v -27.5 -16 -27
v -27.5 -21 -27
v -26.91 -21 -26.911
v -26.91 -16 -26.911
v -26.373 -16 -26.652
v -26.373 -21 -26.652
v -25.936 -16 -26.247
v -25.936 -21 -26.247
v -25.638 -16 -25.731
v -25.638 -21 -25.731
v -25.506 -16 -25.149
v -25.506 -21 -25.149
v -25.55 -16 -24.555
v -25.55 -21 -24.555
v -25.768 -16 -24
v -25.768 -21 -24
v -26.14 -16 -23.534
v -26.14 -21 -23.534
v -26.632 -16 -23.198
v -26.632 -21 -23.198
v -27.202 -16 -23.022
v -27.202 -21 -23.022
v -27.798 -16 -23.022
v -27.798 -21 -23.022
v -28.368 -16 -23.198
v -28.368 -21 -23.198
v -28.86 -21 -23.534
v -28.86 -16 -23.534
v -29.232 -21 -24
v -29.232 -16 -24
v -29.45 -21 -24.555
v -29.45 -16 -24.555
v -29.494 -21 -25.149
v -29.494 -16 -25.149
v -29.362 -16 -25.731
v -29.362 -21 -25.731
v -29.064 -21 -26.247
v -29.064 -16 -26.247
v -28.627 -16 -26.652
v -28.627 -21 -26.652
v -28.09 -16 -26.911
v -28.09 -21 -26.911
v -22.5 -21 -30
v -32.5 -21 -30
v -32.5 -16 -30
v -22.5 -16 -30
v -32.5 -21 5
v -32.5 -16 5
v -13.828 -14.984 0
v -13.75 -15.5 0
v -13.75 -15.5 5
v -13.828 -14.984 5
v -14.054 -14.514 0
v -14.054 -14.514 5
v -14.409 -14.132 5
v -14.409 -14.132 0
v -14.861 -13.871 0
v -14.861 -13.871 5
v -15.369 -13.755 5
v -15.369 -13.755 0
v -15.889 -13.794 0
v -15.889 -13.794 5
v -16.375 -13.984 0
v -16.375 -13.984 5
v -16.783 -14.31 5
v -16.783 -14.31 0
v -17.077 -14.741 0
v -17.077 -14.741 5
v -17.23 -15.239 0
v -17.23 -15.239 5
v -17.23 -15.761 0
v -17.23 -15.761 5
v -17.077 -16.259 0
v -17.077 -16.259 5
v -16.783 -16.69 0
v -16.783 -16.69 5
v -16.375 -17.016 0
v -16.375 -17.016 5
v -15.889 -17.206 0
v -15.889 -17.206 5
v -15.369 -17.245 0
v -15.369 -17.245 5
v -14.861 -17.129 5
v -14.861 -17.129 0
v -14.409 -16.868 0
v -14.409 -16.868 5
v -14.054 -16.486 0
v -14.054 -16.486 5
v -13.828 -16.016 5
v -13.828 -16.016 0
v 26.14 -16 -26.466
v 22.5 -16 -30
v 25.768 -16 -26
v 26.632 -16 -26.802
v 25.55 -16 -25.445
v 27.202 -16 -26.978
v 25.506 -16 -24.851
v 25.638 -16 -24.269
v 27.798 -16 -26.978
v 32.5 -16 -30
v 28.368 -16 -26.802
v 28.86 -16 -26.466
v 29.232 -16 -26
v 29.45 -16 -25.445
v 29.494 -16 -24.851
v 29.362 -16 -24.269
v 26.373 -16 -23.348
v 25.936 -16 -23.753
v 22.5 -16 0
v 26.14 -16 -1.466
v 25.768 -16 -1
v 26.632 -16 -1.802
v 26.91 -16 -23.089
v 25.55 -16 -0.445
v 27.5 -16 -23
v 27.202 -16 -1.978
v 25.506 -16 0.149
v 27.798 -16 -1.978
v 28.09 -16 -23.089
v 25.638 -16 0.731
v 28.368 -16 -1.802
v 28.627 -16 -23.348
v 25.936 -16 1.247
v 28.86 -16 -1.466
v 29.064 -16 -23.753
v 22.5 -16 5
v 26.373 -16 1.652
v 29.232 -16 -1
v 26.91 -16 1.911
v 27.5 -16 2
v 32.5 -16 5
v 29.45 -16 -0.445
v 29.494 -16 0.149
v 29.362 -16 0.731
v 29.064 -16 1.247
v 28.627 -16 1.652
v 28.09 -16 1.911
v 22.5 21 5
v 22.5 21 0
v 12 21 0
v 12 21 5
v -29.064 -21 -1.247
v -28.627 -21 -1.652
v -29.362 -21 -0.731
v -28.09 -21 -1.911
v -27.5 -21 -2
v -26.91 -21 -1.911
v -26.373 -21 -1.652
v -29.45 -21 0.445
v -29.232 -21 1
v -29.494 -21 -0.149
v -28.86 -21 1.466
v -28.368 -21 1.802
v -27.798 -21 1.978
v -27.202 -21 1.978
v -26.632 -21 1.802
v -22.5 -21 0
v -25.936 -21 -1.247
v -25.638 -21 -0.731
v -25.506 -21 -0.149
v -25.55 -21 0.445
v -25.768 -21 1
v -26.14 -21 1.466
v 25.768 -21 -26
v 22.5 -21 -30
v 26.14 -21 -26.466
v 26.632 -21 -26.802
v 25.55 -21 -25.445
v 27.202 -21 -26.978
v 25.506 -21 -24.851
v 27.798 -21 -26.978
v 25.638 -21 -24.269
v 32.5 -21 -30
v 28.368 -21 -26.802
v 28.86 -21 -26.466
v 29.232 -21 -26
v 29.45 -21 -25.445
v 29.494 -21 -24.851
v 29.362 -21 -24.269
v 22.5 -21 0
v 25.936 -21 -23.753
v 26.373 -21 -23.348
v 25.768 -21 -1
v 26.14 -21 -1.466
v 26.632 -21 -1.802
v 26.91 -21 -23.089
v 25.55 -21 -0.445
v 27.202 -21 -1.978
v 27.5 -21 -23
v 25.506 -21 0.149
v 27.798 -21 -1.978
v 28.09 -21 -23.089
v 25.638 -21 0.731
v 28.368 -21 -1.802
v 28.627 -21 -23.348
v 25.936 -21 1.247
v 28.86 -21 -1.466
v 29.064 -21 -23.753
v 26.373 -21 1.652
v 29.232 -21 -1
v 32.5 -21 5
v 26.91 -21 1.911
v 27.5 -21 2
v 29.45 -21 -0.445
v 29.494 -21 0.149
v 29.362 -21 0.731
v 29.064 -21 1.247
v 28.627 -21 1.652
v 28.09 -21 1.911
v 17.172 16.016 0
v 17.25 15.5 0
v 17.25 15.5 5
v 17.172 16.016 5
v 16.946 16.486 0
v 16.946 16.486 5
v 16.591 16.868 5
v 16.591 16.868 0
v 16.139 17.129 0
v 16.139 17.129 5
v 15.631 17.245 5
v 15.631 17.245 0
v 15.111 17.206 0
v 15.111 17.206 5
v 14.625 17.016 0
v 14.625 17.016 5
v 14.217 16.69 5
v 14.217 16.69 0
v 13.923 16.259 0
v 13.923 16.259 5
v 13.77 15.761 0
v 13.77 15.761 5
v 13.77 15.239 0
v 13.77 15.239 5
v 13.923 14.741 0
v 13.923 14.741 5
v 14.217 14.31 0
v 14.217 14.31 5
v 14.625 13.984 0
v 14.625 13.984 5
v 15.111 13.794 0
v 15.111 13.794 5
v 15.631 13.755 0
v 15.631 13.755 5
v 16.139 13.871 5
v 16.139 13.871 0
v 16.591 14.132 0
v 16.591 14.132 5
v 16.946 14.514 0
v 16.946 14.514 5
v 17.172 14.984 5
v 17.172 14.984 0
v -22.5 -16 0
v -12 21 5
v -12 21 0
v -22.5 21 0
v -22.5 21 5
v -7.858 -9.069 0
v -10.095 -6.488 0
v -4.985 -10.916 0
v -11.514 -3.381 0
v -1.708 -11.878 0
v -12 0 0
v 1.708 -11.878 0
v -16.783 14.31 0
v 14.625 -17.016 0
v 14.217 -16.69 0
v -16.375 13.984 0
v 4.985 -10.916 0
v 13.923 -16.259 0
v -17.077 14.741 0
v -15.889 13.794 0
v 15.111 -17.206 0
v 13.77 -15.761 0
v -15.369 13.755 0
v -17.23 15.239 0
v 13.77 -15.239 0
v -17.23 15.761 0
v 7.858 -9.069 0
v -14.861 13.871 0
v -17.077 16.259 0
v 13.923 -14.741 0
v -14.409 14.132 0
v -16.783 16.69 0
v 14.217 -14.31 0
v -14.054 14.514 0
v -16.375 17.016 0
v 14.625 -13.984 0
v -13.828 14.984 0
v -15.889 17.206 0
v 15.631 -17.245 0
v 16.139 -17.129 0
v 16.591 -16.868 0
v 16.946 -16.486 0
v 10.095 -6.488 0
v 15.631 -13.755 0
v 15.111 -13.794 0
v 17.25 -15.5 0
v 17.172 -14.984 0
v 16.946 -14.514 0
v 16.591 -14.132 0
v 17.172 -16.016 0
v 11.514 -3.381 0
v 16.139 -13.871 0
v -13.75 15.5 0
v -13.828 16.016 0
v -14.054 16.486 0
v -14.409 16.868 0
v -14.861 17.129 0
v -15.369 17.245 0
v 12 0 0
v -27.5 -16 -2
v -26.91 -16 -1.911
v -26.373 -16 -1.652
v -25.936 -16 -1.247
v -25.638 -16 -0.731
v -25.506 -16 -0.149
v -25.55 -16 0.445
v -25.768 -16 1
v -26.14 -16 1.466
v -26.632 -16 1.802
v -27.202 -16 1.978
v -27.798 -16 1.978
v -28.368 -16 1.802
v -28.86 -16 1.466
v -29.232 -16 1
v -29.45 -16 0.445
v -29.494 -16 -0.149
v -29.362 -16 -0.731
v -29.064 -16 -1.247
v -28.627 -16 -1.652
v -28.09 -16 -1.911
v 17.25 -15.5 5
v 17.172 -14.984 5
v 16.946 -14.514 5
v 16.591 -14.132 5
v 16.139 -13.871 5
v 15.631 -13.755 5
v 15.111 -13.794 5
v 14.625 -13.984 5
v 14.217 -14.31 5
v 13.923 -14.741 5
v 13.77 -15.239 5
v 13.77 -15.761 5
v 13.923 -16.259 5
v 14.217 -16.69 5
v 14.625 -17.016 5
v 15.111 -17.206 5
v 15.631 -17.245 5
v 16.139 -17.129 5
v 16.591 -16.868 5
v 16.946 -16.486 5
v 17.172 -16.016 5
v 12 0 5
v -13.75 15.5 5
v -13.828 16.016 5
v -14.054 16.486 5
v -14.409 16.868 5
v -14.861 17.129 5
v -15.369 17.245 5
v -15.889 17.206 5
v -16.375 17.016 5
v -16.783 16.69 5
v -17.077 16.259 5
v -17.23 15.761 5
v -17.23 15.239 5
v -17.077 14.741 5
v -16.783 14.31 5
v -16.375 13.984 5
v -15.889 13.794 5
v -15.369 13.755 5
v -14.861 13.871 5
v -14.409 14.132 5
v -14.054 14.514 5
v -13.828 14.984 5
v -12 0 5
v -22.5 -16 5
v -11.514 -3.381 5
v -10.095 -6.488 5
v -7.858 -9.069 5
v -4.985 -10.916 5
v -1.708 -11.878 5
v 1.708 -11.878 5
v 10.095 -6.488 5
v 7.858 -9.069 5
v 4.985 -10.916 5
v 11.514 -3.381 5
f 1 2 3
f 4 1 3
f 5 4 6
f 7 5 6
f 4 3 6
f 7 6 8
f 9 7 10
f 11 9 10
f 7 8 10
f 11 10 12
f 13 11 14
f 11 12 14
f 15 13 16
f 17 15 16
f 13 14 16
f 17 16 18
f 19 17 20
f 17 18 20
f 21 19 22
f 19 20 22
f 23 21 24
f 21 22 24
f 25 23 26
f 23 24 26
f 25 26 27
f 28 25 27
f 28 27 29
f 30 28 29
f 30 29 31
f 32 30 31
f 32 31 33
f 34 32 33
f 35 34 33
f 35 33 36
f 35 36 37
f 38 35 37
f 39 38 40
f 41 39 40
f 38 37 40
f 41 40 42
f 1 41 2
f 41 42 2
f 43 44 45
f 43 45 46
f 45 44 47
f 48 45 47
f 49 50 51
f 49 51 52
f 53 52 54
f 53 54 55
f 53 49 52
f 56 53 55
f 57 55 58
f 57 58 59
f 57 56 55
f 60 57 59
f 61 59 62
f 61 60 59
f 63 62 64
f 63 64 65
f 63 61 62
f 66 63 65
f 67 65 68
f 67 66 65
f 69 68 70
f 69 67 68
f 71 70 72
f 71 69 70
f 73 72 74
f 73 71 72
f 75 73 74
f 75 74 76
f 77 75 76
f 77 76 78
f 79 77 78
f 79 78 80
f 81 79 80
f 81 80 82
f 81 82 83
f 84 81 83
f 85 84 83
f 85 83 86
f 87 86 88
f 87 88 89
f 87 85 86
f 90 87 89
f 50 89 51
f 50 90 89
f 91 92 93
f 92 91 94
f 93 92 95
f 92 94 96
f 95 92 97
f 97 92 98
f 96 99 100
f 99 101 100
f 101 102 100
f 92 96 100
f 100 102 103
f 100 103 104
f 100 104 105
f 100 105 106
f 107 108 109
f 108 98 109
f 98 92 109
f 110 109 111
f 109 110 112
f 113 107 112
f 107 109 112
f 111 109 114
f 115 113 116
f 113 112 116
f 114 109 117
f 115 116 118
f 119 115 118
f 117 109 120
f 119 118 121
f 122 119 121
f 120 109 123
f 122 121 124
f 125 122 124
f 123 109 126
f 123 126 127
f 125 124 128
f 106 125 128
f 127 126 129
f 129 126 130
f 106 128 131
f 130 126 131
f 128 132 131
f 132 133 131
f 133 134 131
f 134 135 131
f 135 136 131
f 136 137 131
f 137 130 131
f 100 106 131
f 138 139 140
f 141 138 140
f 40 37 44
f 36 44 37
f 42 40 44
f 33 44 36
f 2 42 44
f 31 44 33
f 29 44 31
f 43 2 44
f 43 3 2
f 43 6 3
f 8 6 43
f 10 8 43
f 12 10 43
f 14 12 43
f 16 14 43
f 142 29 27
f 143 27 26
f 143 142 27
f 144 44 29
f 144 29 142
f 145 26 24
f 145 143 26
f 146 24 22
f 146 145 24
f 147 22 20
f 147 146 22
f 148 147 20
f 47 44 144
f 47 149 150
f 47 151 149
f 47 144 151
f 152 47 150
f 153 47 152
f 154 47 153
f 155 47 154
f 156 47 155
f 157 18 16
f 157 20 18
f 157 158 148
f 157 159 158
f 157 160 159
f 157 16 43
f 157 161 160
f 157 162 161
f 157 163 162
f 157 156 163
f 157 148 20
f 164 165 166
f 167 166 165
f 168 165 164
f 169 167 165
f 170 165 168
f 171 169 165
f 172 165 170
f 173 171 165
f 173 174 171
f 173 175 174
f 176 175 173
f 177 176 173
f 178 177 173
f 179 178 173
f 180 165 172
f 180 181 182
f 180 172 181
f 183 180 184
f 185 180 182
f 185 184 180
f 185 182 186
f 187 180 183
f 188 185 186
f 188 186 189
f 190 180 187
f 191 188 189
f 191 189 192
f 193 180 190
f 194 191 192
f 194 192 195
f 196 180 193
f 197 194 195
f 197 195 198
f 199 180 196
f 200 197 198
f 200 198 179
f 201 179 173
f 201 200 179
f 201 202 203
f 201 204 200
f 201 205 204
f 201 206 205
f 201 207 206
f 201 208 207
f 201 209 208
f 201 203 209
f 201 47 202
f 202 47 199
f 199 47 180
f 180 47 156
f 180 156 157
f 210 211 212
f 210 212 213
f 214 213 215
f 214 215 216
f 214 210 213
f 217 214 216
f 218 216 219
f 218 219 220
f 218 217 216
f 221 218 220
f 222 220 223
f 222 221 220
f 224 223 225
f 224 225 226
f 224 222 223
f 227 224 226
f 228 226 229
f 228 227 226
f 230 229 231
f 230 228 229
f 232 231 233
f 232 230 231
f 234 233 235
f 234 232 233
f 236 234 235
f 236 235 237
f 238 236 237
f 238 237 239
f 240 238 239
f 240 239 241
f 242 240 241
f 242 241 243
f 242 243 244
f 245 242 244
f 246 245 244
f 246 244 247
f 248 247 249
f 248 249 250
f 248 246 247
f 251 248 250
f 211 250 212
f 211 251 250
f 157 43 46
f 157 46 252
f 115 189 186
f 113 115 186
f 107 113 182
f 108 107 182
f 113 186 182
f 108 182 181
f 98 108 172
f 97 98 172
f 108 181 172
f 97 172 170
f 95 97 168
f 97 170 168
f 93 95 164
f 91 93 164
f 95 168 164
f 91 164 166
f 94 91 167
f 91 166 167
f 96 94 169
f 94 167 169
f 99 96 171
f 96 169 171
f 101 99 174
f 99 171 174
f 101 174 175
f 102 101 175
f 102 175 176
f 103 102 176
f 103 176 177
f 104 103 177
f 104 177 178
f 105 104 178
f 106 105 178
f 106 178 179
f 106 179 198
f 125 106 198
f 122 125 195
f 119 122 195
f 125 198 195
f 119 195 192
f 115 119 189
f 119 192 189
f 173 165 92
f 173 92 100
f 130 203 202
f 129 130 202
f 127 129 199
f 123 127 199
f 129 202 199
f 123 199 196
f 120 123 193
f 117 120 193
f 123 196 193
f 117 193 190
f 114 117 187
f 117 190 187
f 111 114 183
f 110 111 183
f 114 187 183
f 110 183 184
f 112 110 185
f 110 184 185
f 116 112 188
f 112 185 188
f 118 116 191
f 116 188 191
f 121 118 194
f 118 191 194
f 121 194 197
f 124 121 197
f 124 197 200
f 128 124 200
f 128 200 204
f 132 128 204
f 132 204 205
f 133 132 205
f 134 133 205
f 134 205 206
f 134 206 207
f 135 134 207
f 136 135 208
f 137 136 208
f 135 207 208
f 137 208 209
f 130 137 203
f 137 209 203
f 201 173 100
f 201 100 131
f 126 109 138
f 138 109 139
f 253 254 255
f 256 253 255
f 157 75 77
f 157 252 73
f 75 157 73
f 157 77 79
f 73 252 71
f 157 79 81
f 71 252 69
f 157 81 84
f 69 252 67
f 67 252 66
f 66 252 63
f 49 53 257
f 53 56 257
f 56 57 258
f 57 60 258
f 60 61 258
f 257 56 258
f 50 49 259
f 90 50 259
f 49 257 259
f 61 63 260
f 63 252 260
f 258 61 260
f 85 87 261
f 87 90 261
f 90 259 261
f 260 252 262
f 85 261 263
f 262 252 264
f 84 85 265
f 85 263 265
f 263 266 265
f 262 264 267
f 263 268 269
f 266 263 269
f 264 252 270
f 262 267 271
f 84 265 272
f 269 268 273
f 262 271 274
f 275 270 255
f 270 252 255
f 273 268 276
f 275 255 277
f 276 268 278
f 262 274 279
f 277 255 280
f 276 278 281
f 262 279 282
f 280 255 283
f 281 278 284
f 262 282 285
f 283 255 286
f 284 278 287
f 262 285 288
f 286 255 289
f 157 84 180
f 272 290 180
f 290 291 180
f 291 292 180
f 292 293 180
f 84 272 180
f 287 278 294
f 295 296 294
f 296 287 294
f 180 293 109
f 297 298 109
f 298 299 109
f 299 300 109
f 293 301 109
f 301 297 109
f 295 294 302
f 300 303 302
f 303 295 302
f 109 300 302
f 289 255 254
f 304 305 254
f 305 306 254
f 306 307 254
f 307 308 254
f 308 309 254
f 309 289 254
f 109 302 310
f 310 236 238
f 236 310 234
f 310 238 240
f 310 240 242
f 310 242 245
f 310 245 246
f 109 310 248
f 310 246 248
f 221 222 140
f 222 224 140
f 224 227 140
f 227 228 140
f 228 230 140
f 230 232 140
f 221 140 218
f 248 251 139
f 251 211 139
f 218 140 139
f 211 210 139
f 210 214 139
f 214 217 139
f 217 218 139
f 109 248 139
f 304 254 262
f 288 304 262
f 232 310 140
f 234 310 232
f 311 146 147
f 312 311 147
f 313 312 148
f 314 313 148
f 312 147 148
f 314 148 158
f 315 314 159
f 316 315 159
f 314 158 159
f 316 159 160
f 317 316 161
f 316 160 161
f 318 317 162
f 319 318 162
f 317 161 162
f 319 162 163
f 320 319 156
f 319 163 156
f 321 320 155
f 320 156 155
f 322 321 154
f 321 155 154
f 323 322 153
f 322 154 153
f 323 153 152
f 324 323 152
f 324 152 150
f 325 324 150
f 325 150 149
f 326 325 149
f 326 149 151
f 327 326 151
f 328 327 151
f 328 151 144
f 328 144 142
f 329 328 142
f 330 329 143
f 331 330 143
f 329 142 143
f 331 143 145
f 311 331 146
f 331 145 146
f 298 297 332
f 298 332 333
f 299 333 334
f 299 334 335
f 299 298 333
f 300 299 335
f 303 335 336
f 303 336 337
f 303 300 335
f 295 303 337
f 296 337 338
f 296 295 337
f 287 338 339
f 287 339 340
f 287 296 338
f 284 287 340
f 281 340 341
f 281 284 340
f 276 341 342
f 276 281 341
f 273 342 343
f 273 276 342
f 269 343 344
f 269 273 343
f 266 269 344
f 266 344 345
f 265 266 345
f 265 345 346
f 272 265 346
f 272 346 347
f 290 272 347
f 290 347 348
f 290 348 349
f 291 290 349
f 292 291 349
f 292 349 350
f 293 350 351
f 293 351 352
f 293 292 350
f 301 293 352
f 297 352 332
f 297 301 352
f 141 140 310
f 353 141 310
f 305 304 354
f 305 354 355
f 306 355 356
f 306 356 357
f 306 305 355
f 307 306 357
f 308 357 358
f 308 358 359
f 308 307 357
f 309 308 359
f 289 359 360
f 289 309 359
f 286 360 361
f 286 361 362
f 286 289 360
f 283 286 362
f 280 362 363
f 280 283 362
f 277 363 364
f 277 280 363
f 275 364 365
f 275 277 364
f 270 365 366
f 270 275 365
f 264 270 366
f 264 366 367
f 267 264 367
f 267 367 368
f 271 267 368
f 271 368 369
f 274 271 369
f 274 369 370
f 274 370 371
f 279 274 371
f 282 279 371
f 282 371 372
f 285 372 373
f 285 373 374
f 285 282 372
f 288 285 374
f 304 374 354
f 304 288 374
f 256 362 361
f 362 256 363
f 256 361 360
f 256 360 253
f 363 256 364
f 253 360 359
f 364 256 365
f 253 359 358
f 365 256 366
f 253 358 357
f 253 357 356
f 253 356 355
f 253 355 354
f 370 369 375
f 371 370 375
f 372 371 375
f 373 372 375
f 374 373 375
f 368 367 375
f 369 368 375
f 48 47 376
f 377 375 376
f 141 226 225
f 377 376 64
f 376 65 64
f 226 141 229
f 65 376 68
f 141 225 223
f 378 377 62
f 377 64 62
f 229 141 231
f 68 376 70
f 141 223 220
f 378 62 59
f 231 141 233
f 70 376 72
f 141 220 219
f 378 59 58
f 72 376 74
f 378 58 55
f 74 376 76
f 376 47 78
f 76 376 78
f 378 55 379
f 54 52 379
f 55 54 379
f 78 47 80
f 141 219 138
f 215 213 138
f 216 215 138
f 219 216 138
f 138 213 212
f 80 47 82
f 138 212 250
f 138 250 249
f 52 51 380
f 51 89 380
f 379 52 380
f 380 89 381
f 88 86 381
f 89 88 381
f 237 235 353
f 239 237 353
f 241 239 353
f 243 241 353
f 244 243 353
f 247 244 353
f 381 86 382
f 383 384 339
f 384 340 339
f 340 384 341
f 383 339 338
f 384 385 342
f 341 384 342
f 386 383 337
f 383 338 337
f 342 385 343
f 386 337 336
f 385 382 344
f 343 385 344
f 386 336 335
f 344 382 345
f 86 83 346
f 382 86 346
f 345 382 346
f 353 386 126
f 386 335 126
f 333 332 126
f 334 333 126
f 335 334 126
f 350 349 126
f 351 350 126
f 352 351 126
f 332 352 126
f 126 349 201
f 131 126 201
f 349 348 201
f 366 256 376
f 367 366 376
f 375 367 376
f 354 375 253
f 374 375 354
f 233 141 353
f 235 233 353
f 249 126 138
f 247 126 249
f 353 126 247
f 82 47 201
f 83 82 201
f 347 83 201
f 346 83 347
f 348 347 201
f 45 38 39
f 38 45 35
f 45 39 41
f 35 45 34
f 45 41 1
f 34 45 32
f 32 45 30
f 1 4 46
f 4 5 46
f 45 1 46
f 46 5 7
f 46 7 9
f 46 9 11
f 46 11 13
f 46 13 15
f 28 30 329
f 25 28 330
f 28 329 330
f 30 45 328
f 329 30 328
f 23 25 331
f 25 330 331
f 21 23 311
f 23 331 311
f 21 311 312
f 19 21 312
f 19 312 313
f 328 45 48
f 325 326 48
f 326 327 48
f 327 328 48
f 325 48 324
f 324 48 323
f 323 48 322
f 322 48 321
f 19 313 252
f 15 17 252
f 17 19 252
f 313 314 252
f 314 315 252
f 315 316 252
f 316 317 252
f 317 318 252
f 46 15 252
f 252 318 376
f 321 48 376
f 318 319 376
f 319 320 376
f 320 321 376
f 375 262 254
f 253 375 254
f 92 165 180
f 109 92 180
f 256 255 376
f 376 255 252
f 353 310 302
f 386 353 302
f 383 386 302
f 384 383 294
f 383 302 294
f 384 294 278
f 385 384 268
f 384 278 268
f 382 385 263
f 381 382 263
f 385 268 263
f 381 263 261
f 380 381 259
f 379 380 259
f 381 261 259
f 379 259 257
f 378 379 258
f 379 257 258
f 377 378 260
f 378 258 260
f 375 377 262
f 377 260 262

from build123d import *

# Parameters (mm, degrees)
ESBO_O1_R                = 1.75
RESSALTO_EXTRUS_O1_DEPTH = 5
ESBO_O2_W                = 10
ESBO_O2_H                = 35
ESBO_O2_R                = 2
RESSALTO_EXTRUS_O2_DEPTH = 5


with BuildPart() as part:
    # Esboço1 → Ressalto-extrusão1 (new body)
    with BuildSketch(Plane.XY):
        with BuildLine():
            Line((-12, 0), (-12, 21))
            Line((-12, 21), (-22.5, 21))
            Line((-22.5, 21), (-22.5, -21))
            Line((-22.5, -21), (22.5, -21))
            Line((22.5, -21), (22.5, 21))
            Line((22.5, 21), (12, 21))
            Line((12, 21), (12, 0))
            ThreePointArc((12, 0), (0, -12), (-12, 0))
        make_face()
        with Locations((-15.5, 15.5)):
            Circle(ESBO_O1_R, mode=Mode.SUBTRACT)
        with Locations((15.5, 15.5)):
            Circle(ESBO_O1_R, mode=Mode.SUBTRACT)
        with Locations((15.5, -15.5)):
            Circle(ESBO_O1_R, mode=Mode.SUBTRACT)
        with Locations((-15.5, -15.5)):
            Circle(ESBO_O1_R, mode=Mode.SUBTRACT)
    extrude(amount=RESSALTO_EXTRUS_O1_DEPTH)

    # Esboço2 → Ressalto-extrusão2 (add)
    # profile 1 of 2: a face of its own
    with BuildSketch(Plane.XZ.offset(21)):
        with Locations((-27.5, -12.5)):
            Rectangle(ESBO_O2_W, ESBO_O2_H)
        with Locations(Location((-27.5, -25, 0), (0, 0, 270))):
            Circle(ESBO_O2_R, mode=Mode.SUBTRACT)
        with Locations(Location((-27.5, 0, 0), (0, 0, 270))):
            Circle(ESBO_O2_R, mode=Mode.SUBTRACT)
    # profile 2 of 2: a face of its own
    with BuildSketch(Plane.XZ.offset(21)):
        with Locations((27.5, -12.5)):
            Rectangle(ESBO_O2_W, ESBO_O2_H)
        with Locations(Location((27.5, 0, 0), (0, 0, 90))):
            Circle(ESBO_O2_R, mode=Mode.SUBTRACT)
        with Locations(Location((27.5, -25, 0), (0, 0, 90))):
            Circle(ESBO_O2_R, mode=Mode.SUBTRACT)
    extrude(amount=-RESSALTO_EXTRUS_O2_DEPTH)


solid = part.part
